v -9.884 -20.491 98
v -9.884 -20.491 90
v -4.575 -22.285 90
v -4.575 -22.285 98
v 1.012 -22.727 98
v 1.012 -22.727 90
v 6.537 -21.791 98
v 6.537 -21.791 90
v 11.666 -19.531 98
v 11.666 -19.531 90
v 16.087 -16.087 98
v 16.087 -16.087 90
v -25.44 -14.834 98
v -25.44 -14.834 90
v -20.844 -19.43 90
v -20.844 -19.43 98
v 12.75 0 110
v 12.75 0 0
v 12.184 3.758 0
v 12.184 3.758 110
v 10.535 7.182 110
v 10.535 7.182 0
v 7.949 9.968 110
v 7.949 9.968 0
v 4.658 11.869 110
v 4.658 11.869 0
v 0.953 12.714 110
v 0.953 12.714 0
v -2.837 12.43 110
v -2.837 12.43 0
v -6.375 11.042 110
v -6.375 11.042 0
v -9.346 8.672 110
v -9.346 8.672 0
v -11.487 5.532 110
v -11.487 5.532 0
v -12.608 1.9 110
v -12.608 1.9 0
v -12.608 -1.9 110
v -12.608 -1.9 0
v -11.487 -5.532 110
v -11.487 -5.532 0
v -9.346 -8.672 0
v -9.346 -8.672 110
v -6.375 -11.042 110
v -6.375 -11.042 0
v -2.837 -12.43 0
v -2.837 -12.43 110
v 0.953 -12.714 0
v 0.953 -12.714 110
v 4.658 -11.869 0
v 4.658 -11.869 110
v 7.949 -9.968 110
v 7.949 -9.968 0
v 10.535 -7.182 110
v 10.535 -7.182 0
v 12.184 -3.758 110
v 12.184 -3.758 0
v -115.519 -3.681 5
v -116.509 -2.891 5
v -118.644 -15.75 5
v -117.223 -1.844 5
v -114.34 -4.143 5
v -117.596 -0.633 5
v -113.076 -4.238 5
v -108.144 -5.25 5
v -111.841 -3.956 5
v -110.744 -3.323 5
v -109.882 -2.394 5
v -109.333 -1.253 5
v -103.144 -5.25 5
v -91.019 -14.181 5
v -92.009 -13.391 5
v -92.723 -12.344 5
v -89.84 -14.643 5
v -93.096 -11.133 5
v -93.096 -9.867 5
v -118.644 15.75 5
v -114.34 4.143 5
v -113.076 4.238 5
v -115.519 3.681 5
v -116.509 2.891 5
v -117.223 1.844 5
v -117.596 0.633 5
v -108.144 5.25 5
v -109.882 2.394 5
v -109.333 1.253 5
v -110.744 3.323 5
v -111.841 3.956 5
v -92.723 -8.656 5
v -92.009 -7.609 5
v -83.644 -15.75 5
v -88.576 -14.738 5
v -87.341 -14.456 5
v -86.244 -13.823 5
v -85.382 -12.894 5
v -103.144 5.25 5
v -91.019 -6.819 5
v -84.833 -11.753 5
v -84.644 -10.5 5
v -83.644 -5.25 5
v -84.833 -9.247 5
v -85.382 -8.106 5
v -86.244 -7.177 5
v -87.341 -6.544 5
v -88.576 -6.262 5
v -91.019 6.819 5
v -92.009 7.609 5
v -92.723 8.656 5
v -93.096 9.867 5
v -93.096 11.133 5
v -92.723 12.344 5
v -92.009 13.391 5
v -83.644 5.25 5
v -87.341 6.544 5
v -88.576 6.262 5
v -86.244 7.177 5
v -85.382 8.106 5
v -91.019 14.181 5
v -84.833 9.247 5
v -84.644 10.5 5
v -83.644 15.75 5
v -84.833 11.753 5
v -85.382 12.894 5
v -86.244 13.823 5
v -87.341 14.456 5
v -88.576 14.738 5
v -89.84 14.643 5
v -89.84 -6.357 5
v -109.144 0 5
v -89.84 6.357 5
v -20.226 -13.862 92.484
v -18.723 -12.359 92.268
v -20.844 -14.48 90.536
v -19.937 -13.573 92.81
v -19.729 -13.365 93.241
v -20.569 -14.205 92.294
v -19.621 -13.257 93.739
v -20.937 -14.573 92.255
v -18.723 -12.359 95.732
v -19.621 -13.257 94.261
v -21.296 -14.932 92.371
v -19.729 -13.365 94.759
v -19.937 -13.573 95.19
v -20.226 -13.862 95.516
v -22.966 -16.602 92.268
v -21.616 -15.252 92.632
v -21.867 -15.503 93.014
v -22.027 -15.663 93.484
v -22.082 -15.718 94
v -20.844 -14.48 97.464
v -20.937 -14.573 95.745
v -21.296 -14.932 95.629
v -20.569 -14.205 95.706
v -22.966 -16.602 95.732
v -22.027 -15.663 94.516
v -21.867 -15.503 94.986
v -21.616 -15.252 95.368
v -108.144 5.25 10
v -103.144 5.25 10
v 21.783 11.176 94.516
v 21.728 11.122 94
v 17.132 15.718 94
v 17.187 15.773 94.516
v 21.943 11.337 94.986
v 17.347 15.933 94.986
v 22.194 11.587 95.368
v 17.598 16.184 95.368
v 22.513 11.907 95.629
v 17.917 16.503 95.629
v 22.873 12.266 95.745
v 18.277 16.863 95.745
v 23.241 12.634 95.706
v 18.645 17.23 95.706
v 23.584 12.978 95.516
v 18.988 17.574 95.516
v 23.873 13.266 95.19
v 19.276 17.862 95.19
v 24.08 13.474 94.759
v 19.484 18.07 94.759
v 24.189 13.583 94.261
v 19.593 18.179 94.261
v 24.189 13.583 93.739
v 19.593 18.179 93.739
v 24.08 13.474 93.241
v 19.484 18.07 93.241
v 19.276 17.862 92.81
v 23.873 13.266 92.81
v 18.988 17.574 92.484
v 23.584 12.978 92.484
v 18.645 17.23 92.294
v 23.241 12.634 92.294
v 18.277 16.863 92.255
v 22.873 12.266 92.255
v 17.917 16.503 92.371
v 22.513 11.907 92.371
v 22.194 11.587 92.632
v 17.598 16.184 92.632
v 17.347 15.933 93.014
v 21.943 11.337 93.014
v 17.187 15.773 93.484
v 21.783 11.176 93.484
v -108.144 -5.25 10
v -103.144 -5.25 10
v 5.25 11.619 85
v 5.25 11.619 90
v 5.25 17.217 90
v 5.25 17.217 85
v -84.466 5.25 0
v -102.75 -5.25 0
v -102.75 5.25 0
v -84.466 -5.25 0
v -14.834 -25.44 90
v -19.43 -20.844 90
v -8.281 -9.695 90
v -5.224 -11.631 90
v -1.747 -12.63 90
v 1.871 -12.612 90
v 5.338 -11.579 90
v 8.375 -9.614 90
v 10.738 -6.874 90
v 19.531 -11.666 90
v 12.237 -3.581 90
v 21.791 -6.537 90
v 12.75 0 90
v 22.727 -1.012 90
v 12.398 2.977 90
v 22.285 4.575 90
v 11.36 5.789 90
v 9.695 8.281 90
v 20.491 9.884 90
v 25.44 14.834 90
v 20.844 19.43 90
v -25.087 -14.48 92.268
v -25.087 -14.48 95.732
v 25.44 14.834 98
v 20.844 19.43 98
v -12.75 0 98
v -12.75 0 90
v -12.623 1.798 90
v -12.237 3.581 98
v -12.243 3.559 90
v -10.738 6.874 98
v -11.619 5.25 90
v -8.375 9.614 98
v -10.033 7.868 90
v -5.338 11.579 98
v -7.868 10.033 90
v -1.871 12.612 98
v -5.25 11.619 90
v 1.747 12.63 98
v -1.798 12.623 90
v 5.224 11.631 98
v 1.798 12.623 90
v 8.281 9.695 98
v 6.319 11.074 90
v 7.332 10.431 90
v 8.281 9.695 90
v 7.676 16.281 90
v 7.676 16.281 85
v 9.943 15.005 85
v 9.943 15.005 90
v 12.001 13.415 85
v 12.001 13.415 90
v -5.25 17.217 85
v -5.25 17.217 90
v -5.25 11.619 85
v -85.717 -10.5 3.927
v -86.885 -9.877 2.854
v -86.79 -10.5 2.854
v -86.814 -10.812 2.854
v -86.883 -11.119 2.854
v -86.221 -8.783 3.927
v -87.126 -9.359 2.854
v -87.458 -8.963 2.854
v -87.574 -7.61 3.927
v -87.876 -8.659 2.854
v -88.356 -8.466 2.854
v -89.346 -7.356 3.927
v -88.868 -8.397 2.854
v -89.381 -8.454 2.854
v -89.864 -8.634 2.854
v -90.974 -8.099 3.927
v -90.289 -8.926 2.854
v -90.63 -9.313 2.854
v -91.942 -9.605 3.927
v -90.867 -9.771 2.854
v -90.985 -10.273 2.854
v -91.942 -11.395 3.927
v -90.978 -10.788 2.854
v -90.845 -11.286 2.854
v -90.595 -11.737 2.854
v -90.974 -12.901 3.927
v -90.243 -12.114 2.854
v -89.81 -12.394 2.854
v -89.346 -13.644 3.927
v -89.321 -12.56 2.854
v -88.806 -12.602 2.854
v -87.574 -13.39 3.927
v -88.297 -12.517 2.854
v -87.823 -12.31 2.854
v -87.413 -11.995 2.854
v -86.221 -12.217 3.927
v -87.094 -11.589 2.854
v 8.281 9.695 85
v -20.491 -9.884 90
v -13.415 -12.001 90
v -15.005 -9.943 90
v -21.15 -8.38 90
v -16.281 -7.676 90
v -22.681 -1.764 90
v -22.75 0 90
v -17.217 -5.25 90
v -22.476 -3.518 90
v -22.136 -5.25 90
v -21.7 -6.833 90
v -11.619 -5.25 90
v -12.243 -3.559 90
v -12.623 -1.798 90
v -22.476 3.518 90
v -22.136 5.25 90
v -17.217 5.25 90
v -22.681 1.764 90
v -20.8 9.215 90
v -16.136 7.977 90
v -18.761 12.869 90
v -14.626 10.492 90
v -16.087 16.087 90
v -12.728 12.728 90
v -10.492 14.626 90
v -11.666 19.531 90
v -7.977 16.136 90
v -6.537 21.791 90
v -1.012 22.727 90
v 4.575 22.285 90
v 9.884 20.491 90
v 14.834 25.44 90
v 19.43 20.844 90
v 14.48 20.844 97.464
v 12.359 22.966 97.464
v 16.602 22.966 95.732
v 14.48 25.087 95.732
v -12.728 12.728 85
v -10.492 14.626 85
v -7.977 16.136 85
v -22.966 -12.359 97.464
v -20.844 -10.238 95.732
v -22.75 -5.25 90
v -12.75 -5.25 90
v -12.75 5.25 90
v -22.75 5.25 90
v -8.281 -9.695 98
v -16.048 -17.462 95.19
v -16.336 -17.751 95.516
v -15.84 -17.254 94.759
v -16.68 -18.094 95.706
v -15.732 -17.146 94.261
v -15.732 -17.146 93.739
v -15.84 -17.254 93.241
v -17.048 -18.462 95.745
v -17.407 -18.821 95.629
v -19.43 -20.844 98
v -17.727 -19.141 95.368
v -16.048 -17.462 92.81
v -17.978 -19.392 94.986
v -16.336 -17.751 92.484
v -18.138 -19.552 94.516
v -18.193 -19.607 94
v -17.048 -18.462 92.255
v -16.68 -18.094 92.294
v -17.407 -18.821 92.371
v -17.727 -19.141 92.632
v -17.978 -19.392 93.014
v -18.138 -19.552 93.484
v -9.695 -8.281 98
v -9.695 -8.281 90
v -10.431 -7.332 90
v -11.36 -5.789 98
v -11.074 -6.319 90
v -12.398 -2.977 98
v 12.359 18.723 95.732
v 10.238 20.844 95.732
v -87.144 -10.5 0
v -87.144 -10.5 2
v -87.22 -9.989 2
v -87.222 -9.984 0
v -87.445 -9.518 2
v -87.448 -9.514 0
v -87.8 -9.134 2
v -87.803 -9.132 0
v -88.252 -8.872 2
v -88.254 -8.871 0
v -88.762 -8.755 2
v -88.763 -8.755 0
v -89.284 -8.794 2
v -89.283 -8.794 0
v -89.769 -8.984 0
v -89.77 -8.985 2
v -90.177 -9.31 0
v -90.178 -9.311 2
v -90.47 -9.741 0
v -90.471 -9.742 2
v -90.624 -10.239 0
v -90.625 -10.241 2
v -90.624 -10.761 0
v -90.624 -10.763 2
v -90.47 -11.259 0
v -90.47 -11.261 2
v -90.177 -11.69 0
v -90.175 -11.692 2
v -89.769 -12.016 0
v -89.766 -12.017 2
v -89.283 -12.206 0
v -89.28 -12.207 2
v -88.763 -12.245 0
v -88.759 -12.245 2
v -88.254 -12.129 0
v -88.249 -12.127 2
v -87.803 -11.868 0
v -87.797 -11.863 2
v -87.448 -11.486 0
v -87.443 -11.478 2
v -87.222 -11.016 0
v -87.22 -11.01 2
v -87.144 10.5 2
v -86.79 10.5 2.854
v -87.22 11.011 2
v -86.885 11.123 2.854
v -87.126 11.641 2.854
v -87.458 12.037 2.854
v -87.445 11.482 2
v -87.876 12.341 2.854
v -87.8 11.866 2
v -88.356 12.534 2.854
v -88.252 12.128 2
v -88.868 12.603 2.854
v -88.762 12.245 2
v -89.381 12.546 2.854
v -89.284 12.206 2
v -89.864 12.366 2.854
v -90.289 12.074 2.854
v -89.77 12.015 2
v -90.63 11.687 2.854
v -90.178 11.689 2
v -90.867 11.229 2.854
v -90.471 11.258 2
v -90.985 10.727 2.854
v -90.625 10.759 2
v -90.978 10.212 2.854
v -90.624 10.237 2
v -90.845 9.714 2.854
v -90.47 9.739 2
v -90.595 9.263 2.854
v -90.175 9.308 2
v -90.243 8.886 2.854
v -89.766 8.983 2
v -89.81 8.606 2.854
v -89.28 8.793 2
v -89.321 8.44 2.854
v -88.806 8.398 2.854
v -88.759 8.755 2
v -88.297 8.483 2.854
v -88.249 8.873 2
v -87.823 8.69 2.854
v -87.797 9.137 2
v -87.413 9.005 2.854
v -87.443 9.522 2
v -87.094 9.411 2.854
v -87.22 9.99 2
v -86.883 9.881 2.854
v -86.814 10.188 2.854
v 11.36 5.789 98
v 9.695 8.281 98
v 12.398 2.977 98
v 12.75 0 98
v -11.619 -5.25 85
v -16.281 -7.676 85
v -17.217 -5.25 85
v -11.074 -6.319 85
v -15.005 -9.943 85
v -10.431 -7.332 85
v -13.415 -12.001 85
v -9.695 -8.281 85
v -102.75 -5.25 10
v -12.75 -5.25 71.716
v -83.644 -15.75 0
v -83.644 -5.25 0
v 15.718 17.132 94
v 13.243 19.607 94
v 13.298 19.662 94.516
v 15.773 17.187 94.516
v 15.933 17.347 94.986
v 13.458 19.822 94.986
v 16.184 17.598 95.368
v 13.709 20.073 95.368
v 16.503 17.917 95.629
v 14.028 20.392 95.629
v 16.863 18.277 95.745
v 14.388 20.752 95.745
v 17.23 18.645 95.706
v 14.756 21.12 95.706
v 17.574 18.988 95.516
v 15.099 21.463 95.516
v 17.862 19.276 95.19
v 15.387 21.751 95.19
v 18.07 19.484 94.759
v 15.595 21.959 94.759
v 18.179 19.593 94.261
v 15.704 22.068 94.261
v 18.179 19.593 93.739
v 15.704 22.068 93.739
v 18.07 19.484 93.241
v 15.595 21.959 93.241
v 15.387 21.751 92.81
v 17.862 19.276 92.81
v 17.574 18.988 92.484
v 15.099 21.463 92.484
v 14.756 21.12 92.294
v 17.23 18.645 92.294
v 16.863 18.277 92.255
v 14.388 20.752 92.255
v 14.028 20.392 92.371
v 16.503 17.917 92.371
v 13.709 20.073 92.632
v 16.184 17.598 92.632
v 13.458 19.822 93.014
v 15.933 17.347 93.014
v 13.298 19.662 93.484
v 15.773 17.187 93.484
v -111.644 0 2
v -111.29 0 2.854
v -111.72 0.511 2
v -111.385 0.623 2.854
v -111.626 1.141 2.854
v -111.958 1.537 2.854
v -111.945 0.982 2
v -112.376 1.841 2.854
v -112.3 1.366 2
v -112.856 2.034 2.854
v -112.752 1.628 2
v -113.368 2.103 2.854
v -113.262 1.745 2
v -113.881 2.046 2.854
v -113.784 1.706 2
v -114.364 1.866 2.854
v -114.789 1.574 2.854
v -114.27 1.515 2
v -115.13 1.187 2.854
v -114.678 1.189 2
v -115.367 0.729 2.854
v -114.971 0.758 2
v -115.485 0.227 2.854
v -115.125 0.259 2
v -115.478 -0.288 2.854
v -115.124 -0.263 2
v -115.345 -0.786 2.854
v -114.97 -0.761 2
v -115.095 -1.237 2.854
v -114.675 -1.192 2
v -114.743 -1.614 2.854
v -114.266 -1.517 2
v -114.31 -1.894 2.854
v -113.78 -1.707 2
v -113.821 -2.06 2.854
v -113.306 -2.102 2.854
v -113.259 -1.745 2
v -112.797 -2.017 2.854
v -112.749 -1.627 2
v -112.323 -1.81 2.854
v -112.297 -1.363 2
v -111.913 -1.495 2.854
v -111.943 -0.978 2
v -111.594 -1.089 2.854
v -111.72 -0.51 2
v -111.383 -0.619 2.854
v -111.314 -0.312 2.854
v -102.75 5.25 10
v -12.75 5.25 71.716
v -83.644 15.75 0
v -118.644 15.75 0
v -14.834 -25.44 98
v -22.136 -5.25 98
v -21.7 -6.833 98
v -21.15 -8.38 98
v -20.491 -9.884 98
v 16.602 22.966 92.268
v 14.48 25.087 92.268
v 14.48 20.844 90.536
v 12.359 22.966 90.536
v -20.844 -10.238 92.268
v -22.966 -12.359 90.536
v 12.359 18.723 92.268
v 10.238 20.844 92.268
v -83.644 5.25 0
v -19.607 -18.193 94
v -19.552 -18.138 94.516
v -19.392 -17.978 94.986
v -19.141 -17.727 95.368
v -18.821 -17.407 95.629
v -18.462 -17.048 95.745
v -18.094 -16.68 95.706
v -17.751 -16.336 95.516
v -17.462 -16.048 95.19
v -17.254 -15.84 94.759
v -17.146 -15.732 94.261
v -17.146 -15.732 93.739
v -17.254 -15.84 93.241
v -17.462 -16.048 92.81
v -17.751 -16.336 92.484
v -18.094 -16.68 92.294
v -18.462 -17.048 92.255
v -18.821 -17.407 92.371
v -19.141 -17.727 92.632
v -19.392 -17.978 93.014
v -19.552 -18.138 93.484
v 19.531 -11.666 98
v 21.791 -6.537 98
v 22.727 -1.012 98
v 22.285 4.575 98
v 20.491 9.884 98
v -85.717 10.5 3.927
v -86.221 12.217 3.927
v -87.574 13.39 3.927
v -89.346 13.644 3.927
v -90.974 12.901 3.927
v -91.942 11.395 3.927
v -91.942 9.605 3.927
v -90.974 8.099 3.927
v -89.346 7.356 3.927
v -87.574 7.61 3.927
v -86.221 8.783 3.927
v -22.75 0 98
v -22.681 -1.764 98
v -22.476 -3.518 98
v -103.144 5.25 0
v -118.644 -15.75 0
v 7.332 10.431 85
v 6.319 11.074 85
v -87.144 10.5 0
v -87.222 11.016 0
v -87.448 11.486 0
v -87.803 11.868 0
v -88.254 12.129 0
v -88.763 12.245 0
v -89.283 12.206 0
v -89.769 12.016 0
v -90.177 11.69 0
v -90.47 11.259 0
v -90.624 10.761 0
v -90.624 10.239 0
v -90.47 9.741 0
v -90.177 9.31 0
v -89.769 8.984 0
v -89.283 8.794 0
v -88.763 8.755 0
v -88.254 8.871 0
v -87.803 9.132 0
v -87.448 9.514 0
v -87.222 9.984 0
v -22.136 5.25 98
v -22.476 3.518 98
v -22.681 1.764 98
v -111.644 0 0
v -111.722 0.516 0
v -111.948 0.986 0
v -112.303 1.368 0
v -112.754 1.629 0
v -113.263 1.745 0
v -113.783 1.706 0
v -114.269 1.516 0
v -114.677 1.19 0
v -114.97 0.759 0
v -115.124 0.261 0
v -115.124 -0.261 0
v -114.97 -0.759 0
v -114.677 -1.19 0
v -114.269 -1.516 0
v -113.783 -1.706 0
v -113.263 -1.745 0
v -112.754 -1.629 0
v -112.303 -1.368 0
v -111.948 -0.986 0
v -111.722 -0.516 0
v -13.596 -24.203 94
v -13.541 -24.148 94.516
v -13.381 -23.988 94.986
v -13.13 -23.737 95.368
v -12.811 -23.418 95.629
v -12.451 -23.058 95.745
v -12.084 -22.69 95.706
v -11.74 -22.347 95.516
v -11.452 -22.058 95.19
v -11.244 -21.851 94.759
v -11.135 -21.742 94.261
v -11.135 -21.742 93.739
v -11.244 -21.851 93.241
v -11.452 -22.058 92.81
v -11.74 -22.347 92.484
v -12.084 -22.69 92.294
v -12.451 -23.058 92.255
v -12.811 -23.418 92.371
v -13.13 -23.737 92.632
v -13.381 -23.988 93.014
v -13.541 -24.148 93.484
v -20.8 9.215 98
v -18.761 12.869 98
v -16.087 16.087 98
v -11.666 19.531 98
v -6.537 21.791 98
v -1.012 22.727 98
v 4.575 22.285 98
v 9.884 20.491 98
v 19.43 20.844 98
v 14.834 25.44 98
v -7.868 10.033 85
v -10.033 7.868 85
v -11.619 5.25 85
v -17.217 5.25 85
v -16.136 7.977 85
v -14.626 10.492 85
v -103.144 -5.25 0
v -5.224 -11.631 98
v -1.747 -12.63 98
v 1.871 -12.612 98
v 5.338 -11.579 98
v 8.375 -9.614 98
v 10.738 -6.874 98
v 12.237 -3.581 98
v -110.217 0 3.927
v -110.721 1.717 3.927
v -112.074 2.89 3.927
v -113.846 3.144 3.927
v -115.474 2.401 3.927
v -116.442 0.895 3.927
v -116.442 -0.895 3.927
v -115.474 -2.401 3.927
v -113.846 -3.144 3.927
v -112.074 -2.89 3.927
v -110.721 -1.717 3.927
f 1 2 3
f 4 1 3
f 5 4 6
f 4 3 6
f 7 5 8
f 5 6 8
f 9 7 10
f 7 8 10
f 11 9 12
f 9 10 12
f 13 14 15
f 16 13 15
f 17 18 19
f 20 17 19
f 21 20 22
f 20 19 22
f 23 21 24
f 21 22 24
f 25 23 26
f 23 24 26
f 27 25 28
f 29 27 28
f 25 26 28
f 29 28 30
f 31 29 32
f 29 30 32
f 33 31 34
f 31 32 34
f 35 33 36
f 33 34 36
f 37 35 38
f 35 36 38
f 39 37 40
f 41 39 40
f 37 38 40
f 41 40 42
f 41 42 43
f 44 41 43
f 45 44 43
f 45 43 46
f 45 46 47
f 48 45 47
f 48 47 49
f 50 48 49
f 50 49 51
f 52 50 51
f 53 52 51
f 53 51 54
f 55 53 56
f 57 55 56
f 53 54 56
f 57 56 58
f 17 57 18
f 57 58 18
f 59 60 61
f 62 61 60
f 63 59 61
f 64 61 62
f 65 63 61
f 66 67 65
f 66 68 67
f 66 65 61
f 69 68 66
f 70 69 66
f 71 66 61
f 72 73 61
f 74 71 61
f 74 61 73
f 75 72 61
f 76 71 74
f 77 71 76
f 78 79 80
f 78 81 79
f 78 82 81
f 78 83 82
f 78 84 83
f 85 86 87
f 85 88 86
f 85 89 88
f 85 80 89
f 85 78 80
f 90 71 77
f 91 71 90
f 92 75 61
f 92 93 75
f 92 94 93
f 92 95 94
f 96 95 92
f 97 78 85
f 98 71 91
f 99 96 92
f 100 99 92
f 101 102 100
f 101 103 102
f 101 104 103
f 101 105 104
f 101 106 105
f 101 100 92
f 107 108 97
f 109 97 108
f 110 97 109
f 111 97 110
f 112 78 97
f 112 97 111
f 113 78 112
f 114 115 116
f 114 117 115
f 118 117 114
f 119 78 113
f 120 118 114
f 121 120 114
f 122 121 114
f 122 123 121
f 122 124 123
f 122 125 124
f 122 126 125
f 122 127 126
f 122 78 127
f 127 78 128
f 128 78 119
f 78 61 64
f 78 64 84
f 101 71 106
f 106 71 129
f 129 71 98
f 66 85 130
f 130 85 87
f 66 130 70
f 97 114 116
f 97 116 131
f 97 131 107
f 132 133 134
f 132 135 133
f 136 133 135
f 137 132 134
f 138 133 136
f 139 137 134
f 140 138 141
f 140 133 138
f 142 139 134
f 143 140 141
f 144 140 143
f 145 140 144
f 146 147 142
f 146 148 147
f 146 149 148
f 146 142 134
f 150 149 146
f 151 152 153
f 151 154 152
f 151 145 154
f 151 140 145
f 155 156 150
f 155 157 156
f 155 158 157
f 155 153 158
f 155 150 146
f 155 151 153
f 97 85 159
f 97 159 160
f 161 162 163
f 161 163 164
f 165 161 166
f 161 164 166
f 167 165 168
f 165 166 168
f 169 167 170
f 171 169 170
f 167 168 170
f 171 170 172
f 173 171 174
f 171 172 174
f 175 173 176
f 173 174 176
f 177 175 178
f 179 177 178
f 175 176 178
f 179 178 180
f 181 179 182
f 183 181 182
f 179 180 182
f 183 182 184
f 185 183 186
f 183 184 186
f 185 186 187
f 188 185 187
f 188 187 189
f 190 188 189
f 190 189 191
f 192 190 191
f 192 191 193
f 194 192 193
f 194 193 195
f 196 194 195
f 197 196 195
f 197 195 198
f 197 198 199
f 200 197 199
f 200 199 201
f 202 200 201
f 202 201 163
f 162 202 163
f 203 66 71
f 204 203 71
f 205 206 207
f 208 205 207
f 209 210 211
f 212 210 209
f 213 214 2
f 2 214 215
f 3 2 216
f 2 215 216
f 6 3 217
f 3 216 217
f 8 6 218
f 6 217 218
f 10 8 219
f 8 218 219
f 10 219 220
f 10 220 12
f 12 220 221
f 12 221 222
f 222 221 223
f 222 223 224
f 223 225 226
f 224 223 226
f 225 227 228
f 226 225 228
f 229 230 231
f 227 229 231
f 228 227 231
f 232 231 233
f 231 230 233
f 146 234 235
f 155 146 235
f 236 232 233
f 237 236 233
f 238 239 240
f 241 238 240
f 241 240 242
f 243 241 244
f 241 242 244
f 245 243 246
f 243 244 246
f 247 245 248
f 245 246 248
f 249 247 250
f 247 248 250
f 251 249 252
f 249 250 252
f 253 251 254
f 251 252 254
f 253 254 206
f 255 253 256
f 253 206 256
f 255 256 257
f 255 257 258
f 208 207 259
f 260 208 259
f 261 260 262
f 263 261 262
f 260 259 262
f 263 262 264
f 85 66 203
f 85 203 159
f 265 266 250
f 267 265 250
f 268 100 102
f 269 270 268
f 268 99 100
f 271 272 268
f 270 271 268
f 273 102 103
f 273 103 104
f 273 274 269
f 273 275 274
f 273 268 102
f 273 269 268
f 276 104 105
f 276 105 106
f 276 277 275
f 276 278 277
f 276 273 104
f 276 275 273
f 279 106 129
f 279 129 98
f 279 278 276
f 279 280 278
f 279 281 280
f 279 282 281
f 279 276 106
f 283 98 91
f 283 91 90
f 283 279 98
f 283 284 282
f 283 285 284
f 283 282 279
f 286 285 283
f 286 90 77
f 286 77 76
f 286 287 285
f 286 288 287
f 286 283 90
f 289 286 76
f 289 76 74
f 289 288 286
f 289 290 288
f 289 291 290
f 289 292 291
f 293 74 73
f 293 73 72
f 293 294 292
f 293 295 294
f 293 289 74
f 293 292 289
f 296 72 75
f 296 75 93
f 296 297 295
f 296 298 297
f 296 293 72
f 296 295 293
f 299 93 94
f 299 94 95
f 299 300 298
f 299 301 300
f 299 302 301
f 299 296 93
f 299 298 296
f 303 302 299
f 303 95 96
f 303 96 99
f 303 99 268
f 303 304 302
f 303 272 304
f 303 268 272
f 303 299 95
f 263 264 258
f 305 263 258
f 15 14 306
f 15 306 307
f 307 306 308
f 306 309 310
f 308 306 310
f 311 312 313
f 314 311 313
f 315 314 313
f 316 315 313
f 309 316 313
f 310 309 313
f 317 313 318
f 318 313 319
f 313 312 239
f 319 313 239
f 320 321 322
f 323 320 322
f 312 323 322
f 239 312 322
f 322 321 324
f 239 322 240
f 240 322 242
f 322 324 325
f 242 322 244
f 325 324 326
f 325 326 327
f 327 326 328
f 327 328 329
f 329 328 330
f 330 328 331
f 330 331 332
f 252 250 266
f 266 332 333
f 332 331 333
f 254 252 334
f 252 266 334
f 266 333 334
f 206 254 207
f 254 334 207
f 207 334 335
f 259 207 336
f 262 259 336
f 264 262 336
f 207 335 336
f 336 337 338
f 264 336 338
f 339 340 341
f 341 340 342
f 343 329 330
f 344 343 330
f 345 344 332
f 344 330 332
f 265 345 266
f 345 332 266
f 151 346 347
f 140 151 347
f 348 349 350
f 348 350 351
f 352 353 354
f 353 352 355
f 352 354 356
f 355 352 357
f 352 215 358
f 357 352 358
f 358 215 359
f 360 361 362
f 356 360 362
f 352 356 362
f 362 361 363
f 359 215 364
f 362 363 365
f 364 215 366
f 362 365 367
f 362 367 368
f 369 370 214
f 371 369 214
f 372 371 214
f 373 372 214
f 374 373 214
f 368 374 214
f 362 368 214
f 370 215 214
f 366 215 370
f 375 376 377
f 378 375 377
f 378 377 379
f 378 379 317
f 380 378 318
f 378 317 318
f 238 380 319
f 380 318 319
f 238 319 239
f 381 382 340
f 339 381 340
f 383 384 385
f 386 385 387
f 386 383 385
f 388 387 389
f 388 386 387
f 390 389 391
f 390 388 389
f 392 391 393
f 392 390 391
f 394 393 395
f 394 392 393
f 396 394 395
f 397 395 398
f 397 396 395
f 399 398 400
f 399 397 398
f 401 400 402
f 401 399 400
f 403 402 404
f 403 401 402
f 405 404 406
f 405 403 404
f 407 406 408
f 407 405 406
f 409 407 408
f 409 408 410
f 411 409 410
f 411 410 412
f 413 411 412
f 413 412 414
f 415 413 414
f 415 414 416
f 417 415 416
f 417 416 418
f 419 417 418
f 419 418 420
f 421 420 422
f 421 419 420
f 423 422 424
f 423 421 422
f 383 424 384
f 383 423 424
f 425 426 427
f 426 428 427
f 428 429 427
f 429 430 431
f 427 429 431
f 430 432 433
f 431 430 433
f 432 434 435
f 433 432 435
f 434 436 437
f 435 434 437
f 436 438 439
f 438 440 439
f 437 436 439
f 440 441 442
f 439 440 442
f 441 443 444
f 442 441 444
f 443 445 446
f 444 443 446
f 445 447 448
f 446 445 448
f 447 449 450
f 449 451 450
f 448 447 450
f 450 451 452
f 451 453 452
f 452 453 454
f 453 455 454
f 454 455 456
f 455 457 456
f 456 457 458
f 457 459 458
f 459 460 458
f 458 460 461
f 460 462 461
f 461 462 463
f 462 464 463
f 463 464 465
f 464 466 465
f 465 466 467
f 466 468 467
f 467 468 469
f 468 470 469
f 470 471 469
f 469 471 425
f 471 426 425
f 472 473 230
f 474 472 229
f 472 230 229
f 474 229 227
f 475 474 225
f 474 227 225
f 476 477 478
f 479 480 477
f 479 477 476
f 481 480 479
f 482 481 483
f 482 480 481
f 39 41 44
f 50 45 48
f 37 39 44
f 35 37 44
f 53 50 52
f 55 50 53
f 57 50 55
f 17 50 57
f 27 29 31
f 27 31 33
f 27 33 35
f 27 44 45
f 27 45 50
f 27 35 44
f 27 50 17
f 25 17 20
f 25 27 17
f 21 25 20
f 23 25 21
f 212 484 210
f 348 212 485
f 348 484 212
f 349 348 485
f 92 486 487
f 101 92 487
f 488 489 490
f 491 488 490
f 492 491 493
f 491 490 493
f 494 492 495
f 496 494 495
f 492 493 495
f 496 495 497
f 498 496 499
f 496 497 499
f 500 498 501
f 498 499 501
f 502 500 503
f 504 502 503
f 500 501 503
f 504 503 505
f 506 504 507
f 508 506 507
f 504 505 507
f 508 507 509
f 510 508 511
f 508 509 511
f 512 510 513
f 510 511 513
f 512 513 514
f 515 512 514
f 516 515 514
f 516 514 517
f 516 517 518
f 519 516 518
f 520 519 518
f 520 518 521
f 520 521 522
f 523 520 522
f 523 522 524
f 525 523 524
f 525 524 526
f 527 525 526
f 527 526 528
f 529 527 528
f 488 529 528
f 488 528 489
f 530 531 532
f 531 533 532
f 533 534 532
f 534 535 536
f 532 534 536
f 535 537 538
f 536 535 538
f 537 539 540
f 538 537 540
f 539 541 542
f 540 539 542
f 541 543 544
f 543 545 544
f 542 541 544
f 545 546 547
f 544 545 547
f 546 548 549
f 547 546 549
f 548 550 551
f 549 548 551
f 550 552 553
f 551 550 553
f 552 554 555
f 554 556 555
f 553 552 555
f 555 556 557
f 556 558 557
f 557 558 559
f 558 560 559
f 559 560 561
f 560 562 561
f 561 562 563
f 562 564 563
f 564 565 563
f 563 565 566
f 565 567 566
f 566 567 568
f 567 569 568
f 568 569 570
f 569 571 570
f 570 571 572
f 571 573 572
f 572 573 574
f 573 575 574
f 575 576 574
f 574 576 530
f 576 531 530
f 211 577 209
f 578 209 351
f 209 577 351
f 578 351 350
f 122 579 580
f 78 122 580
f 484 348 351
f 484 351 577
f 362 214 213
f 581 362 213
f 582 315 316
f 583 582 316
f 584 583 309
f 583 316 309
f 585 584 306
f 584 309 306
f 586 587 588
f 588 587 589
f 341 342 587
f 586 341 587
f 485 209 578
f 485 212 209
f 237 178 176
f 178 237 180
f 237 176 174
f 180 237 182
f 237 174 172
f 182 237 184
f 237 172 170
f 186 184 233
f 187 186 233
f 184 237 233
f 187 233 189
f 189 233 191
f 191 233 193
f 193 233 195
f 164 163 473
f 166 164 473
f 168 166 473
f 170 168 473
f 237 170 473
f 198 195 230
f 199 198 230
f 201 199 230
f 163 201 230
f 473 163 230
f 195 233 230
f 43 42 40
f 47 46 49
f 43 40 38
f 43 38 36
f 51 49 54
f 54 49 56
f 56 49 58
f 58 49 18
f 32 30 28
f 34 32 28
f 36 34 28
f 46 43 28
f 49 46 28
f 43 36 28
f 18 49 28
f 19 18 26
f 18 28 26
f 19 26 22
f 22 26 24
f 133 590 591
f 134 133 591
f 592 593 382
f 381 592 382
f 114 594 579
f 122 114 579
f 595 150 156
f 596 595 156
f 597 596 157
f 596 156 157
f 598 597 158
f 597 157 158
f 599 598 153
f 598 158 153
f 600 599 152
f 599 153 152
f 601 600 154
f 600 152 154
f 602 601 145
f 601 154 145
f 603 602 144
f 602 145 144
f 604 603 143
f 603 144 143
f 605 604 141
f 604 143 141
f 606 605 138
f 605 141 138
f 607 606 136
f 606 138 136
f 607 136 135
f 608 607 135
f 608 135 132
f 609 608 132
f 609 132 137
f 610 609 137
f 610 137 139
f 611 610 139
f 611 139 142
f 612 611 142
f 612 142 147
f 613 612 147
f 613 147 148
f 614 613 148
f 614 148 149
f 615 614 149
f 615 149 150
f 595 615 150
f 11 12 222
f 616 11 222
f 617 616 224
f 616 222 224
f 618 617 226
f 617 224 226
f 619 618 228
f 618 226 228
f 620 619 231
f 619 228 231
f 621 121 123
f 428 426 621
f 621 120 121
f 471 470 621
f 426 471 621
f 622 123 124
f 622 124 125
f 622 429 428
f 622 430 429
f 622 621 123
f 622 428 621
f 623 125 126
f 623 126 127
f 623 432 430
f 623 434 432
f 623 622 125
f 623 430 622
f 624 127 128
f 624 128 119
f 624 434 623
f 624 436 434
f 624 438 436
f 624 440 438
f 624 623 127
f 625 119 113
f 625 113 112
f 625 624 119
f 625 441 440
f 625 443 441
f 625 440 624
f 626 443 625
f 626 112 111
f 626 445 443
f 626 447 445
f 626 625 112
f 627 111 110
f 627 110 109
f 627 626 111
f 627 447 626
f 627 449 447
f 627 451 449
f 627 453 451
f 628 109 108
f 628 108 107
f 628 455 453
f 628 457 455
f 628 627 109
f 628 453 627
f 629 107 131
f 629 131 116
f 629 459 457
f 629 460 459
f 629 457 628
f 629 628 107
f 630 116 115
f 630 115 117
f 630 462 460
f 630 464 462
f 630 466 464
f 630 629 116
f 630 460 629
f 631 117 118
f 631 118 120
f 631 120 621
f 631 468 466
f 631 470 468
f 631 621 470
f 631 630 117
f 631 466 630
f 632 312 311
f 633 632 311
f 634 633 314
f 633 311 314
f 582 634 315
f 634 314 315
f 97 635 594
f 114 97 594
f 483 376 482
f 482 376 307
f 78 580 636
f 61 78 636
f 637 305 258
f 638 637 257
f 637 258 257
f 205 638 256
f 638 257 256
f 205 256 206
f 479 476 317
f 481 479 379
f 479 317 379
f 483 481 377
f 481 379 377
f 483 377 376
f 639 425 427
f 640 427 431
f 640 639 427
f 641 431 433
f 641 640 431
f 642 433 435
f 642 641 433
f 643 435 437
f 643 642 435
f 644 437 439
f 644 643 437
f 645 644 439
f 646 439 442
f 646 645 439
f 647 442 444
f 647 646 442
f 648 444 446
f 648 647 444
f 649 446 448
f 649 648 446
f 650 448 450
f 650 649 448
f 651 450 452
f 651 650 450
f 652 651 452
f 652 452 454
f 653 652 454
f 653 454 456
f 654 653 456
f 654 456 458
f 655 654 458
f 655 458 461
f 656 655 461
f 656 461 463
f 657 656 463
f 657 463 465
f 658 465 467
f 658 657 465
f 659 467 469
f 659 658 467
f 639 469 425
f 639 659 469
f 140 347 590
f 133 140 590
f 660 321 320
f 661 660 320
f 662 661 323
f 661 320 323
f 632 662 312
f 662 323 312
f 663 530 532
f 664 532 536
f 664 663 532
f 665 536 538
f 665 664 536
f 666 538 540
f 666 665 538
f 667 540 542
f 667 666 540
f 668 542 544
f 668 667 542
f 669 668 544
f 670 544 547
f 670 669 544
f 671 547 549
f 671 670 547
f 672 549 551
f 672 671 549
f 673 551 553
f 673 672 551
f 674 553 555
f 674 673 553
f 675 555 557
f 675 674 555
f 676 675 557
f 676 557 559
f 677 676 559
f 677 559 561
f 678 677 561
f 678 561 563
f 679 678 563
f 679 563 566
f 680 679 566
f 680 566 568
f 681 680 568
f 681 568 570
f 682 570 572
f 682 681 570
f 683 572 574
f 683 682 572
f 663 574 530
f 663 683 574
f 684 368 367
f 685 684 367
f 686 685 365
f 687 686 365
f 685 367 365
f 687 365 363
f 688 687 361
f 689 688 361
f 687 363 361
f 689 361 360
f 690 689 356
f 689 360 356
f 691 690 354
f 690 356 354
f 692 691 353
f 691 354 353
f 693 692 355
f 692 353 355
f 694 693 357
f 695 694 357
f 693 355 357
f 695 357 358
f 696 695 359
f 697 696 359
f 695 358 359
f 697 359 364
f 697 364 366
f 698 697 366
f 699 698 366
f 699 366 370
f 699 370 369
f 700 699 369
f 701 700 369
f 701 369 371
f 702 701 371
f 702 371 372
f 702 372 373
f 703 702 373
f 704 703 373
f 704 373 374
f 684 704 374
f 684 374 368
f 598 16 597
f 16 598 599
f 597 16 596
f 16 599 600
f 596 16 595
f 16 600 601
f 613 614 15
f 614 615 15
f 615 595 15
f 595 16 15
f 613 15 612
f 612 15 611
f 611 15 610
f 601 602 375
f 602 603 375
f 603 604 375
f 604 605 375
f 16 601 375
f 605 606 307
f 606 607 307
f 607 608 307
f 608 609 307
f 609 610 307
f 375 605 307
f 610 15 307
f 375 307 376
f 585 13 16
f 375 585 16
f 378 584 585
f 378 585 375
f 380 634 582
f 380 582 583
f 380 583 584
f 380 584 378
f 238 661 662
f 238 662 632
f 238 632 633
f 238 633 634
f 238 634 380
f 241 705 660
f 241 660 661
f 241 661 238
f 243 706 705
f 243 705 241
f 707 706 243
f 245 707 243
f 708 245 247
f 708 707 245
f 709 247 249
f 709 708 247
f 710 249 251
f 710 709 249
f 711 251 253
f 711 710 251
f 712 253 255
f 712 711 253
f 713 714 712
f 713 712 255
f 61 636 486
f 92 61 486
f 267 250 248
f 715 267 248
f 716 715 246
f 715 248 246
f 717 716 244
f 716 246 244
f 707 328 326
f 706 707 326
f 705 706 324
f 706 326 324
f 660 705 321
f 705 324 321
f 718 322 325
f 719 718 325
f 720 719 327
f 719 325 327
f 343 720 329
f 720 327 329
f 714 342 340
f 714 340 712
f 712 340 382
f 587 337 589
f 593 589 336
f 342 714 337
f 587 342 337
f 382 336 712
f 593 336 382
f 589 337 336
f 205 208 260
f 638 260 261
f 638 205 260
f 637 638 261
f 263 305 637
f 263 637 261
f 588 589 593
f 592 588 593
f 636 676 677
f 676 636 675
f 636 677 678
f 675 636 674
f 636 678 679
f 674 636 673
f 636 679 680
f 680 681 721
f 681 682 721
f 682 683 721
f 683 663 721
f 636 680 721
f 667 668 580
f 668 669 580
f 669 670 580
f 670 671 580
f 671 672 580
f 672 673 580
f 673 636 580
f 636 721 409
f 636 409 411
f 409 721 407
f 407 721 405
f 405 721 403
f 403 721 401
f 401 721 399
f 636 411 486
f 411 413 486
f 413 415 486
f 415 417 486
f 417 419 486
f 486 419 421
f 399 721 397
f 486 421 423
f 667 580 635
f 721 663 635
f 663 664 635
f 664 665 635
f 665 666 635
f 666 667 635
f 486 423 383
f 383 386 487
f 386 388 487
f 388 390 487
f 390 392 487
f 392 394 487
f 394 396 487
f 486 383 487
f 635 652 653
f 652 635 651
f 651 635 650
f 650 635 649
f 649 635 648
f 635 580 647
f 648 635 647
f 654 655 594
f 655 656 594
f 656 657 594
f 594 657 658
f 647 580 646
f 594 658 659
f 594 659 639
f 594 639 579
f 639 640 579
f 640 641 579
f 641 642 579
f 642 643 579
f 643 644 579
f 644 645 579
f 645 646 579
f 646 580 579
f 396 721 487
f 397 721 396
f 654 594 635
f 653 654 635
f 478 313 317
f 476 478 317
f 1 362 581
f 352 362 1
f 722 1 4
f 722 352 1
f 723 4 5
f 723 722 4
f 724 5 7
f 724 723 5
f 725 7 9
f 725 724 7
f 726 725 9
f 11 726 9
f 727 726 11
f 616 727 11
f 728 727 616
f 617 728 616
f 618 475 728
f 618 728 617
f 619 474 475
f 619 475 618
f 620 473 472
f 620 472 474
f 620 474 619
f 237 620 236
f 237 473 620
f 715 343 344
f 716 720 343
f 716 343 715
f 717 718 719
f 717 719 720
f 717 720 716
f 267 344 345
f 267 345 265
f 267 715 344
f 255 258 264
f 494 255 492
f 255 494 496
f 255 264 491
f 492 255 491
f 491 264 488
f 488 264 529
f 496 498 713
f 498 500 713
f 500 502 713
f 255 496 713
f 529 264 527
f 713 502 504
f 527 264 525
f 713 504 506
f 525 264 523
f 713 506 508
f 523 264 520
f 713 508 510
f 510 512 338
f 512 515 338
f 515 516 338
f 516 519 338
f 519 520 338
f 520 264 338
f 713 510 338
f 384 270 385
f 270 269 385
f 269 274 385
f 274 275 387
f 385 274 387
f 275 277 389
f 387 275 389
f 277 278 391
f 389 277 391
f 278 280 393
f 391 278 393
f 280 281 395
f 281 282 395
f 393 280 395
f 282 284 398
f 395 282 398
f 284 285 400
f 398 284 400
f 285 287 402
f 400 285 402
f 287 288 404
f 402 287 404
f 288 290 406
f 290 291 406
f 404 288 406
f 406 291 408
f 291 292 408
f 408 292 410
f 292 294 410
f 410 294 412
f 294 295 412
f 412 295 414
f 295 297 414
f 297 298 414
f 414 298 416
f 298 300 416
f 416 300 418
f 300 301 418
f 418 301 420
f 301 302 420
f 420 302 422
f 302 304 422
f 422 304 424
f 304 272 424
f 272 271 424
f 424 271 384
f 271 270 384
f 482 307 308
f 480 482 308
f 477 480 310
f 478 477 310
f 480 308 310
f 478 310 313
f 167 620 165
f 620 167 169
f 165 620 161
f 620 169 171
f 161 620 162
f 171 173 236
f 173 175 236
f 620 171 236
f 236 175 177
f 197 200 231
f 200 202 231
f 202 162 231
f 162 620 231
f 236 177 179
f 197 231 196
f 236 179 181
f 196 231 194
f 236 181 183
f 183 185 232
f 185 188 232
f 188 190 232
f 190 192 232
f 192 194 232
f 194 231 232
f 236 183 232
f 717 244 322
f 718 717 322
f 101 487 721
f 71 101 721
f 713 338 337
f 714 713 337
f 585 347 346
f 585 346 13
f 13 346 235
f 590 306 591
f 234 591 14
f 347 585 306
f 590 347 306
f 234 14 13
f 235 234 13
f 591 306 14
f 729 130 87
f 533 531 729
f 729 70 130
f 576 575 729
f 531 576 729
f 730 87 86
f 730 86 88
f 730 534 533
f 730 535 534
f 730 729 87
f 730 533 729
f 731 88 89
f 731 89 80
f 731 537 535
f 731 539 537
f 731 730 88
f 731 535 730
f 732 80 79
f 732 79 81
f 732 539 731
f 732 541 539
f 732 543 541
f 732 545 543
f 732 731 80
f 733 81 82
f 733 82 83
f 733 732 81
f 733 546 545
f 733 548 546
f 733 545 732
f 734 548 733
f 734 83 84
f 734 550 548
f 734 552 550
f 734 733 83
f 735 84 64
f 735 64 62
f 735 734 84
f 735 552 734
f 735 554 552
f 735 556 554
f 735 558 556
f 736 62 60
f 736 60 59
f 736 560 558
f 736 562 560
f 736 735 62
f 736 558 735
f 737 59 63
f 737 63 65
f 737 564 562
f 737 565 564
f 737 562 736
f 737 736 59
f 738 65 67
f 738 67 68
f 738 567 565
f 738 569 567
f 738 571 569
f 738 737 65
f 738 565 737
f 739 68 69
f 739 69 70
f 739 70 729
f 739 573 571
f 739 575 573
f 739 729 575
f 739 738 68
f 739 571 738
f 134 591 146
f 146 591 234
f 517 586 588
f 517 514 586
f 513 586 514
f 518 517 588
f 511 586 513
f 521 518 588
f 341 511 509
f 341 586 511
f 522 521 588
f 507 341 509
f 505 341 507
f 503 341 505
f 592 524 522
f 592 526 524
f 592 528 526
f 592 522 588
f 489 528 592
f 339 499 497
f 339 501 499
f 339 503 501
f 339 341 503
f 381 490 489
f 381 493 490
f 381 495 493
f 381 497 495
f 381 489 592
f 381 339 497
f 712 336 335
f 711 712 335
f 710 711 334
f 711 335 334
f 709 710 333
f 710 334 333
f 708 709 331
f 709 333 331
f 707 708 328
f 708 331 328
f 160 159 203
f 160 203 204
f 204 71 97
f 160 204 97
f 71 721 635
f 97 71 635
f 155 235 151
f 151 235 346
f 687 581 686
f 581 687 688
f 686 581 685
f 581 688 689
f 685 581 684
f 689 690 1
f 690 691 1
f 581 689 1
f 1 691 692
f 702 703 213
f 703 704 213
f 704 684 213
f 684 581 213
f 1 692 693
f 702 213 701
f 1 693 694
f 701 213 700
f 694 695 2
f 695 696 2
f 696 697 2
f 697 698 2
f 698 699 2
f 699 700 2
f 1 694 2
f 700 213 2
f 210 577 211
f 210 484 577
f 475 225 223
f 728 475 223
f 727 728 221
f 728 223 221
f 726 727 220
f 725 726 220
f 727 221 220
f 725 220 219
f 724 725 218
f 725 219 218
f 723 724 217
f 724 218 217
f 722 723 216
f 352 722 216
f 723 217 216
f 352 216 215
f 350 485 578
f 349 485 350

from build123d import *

# Parameters (mm, degrees)
F0_R      = 1.75
F1_DEPTH  = 5
F0_W      = 5
F0_H      = 10.5
F2_DEPTH  = 10
F3_SIZE   = 2.5
F4_SIZE   = 0.5
F0_R_2    = 12.75
F5_DEPTH  = 110
F7_DEPTH  = 5.25
F9_DEPTH  = 8
F11_DEPTH = 5
F12_R     = 1.75
F13_DEPTH = 3
F14_DEPTH = 43.4791866087


with BuildPart() as f1:
    # F0 (on Top) → F1 (new body)
    with BuildSketch(Plane.XY):
        Polygon((-83.6437979341, 5.25), (-83.6437979341, 15.75), (-118.6437979341, 15.75), (-118.6437979341, -15.75), (-83.6437979341, -15.75), (-83.6437979341, -5.25), (-103.1437979341, -5.25), (-108.1437979341, -5.25), (-108.1437979341, 5.25), (-103.1437979341, 5.25), align=None)
        with Locations((-88.8937979341, -10.5)):
            Circle(F0_R, mode=Mode.SUBTRACT)
        with Locations((-113.3937979341, 0)):
            Circle(F0_R, mode=Mode.SUBTRACT)
        with Locations((-88.8937979341, 10.5)):
            Circle(F0_R, mode=Mode.SUBTRACT)
    extrude(amount=F1_DEPTH)

    # F0 (on Top) → F2 (join)
    with BuildSketch(Plane.XY):
        with Locations((-105.6437979341, 0)):
            Rectangle(F0_W, F0_H)
    extrude(amount=F2_DEPTH)

    # F3
    f3_edges = [f1.edges().sort_by_distance(p)[0] for p in [
        (-115.143798, 0, 5),
        (-90.643798, 10.5, 5),
        (-90.643798, -10.5, 5),
    ]]
    chamfer(f3_edges, length=F3_SIZE)

    # F4
    f4_edges = [f1.edges().sort_by_distance(p)[0] for p in [
        (-115.143798, 0, 2.5),
        (-90.643798, 10.5, 2.5),
        (-90.643798, -10.5, 2.5),
    ]]
    chamfer(f4_edges, length=F4_SIZE)


with BuildPart() as f5:
    # F0 (on Top) → F5 (new body)
    with BuildSketch(Plane.XY):
        Circle(F0_R_2)
    extrude(amount=F5_DEPTH)


with BuildPart() as f7:
    # F6 (on Front) → F7 (new body, symmetric)
    with BuildSketch(Plane.XZ):
        Polygon((-84.4657287525, 0), (-12.75, 71.7157287525), (-12.75, 90), (-22.75, 90), (-102.75, 10), (-102.75, 0), align=None)
    extrude(amount=F7_DEPTH, both=True)


with BuildPart() as f9:
    # F8 (on face) → F9 (new body)
    with BuildSketch(Plane.XY.offset(90)):
        with BuildLine():
            ThreePointArc((-12.75, 0), (-5.337750656, 11.5788996858), (8.2807322249, 9.6949457873))
            Line((8.2807322249, 9.6949457873), (19.4300120858, 20.8442256481))
            Line((19.4300120858, 20.8442256481), (14.833818008, 25.4404197258))
            Line((14.833818008, 25.4404197258), (9.8840705397, 20.4906722575))
            ThreePointArc((9.8840705397, 20.4906722575), (-3.8035348461, 22.4297931929), (-16.086679272, 16.086679272))
            ThreePointArc((-16.086679272, 16.086679272), (-19.8645571212, 11.0888173572), (-22.1359436212, 5.25))
            Line((-22.1359436212, 5.25), (-12.75, 5.25))
            Line((-12.75, 5.25), (-12.75, 0))
        make_face()
        with BuildLine():
            Line((-12.75, -5.25), (-12.75, 0))
            Line((-12.75, 0), (-12.75, 5.25))
            Line((-12.75, 5.25), (-22.1359436212, 5.25))
            ThreePointArc((-22.1359436212, 5.25), (-22.5959644337, 2.6428944945), (-22.75, 0))
            ThreePointArc((-22.75, 0), (-22.5959644337, -2.6428944945), (-22.1359436212, -5.25))
            Line((-22.1359436212, -5.25), (-12.75, -5.25))
        make_face()
        with BuildLine():
            Line((-20.8442256481, -19.4300120858), (-9.6949457873, -8.2807322249))
            ThreePointArc((-9.6949457873, -8.2807322249), (-11.9618781717, -4.4131588013), (-12.75, 0))
            Line((-12.75, 0), (-12.75, -5.25))
            Line((-12.75, -5.25), (-22.1359436212, -5.25))
            ThreePointArc((-22.1359436212, -5.25), (-21.4388840139, -7.6116195544), (-20.4906722575, -9.8840705397))
            Line((-20.4906722575, -9.8840705397), (-25.4404197258, -14.833818008))
            Line((-25.4404197258, -14.833818008), (-20.8442256481, -19.4300120858))
        make_face()
    extrude(amount=F9_DEPTH)

    # F10 (on face) → F11 (join)
    with BuildSketch(Plane(origin=(0, 0, 90), x_dir=(1, 0, 0), z_dir=(0, 0, -1))):
        with BuildLine():
            Line((-12.75, 5.25), (-11.6189500386, 5.25))
            ThreePointArc((-11.6189500386, 5.25), (-10.764147587, 6.8334198412), (-9.6949457873, 8.2807322249))
            Line((-9.6949457873, 8.2807322249), (-13.4153718083, 12.001158246))
            ThreePointArc((-13.4153718083, 12.001158246), (-15.6839282526, 8.8325757606), (-17.2173604249, 5.25))
            Line((-17.2173604249, 5.25), (-12.75, 5.25))
        make_face()
        with BuildLine():
            Line((-11.6189500386, -5.25), (-12.75, -5.25))
            Line((-12.75, -5.25), (-17.2173604249, -5.25))
            ThreePointArc((-17.2173604249, -5.25), (-15.4324273977, -9.2649978206), (-12.7279220614, -12.7279220614))
            ThreePointArc((-12.7279220614, -12.7279220614), (-9.2649978206, -15.4324273977), (-5.25, -17.2173604249))
            Line((-5.25, -17.2173604249), (-5.25, -12.75))
            Line((-5.25, -12.75), (-5.25, -11.6189500386))
            ThreePointArc((-5.25, -11.6189500386), (-9.0156114601, -9.0156114601), (-11.6189500386, -5.25))
        make_face()
        with BuildLine():
            ThreePointArc((8.2807322249, -9.6949457873), (6.8334198412, -10.764147587), (5.25, -11.6189500386))
            Line((5.25, -11.6189500386), (5.25, -12.75))
            Line((5.25, -12.75), (5.25, -17.2173604249))
            ThreePointArc((5.25, -17.2173604249), (8.8325757606, -15.6839282526), (12.001158246, -13.4153718083))
            Line((12.001158246, -13.4153718083), (8.2807322249, -9.6949457873))
        make_face()
    extrude(amount=F11_DEPTH)

    # F12 (on face) → F13 (cut)
    with BuildSketch(Plane(origin=(-5.3033008589, 5.3033008589, 0), x_dir=(-0.7071067812, -0.7071067812, 0), z_dir=(-0.7071067812, 0.7071067812, 0))):
        Polygon((-27.9781866087, 95.7320508076), (-27.9781866087, 92.2679491924), (-24.9781866087, 90.5358983849), (-21.9781866087, 92.2679491924), (-21.9781866087, 95.7320508076), (-24.9781866087, 97.4641016151), align=None)
        with Locations((-24.9781866087, 94)):
            Circle(F12_R, mode=Mode.SUBTRACT)
        Polygon((21.9781866087, 95.7320508076), (21.9781866087, 92.2679491924), (24.9781866087, 90.5358983849), (27.9781866087, 92.2679491924), (27.9781866087, 95.7320508076), (24.9781866087, 97.4641016151), align=None)
        with Locations((24.9781866087, 94)):
            Circle(F12_R, mode=Mode.SUBTRACT)
    extrude(amount=-F13_DEPTH, mode=Mode.SUBTRACT)


with BuildPart() as f9b:
    # F8 (on face) → F9, piece 2 (new body)
    with BuildSketch(Plane.XY.offset(90)):
        with BuildLine():
            ThreePointArc((9.6949457873, 8.2807322249), (11.9618781717, 4.4131588013), (12.75, 0))
            ThreePointArc((12.75, 0), (5.337750656, -11.5788996858), (-8.2807322249, -9.6949457873))
            Line((-8.2807322249, -9.6949457873), (-19.4300120858, -20.8442256481))
            Line((-19.4300120858, -20.8442256481), (-14.833818008, -25.4404197258))
            Line((-14.833818008, -25.4404197258), (-9.8840705397, -20.4906722575))
            ThreePointArc((-9.8840705397, -20.4906722575), (3.8035348461, -22.4297931929), (16.086679272, -16.086679272))
            ThreePointArc((16.086679272, -16.086679272), (22.4297931929, -3.8035348461), (20.4906722575, 9.8840705397))
            Line((20.4906722575, 9.8840705397), (25.4404197258, 14.833818008))
            Line((25.4404197258, 14.833818008), (20.8442256481, 19.4300120858))
            Line((20.8442256481, 19.4300120858), (9.6949457873, 8.2807322249))
        make_face()
    extrude(amount=F9_DEPTH)


with BuildPart() as f14_tool:
    # F12 (on face) → F14 (new body, through all)
    with BuildSketch(Plane(origin=(-5.3033008589, 5.3033008589, 0), x_dir=(-0.7071067812, -0.7071067812, 0), z_dir=(-0.7071067812, 0.7071067812, 0))):
        with Locations((-24.9781866087, 94)):
            Circle(F12_R)
        with Locations((24.9781866087, 94)):
            Circle(F12_R)
    extrude(amount=-F14_DEPTH)


with BuildPart() as f9_1:
    add(f9.part)

    # F14: cut by f14_tool
    add(f14_tool.part, mode=Mode.SUBTRACT)


with BuildPart() as f9b_1:
    add(f9b.part)

    # F14: cut by f14_tool
    add(f14_tool.part, mode=Mode.SUBTRACT)


solid = Compound([f1.part, f5.part, f7.part, f9_1.part, f9b_1.part])
